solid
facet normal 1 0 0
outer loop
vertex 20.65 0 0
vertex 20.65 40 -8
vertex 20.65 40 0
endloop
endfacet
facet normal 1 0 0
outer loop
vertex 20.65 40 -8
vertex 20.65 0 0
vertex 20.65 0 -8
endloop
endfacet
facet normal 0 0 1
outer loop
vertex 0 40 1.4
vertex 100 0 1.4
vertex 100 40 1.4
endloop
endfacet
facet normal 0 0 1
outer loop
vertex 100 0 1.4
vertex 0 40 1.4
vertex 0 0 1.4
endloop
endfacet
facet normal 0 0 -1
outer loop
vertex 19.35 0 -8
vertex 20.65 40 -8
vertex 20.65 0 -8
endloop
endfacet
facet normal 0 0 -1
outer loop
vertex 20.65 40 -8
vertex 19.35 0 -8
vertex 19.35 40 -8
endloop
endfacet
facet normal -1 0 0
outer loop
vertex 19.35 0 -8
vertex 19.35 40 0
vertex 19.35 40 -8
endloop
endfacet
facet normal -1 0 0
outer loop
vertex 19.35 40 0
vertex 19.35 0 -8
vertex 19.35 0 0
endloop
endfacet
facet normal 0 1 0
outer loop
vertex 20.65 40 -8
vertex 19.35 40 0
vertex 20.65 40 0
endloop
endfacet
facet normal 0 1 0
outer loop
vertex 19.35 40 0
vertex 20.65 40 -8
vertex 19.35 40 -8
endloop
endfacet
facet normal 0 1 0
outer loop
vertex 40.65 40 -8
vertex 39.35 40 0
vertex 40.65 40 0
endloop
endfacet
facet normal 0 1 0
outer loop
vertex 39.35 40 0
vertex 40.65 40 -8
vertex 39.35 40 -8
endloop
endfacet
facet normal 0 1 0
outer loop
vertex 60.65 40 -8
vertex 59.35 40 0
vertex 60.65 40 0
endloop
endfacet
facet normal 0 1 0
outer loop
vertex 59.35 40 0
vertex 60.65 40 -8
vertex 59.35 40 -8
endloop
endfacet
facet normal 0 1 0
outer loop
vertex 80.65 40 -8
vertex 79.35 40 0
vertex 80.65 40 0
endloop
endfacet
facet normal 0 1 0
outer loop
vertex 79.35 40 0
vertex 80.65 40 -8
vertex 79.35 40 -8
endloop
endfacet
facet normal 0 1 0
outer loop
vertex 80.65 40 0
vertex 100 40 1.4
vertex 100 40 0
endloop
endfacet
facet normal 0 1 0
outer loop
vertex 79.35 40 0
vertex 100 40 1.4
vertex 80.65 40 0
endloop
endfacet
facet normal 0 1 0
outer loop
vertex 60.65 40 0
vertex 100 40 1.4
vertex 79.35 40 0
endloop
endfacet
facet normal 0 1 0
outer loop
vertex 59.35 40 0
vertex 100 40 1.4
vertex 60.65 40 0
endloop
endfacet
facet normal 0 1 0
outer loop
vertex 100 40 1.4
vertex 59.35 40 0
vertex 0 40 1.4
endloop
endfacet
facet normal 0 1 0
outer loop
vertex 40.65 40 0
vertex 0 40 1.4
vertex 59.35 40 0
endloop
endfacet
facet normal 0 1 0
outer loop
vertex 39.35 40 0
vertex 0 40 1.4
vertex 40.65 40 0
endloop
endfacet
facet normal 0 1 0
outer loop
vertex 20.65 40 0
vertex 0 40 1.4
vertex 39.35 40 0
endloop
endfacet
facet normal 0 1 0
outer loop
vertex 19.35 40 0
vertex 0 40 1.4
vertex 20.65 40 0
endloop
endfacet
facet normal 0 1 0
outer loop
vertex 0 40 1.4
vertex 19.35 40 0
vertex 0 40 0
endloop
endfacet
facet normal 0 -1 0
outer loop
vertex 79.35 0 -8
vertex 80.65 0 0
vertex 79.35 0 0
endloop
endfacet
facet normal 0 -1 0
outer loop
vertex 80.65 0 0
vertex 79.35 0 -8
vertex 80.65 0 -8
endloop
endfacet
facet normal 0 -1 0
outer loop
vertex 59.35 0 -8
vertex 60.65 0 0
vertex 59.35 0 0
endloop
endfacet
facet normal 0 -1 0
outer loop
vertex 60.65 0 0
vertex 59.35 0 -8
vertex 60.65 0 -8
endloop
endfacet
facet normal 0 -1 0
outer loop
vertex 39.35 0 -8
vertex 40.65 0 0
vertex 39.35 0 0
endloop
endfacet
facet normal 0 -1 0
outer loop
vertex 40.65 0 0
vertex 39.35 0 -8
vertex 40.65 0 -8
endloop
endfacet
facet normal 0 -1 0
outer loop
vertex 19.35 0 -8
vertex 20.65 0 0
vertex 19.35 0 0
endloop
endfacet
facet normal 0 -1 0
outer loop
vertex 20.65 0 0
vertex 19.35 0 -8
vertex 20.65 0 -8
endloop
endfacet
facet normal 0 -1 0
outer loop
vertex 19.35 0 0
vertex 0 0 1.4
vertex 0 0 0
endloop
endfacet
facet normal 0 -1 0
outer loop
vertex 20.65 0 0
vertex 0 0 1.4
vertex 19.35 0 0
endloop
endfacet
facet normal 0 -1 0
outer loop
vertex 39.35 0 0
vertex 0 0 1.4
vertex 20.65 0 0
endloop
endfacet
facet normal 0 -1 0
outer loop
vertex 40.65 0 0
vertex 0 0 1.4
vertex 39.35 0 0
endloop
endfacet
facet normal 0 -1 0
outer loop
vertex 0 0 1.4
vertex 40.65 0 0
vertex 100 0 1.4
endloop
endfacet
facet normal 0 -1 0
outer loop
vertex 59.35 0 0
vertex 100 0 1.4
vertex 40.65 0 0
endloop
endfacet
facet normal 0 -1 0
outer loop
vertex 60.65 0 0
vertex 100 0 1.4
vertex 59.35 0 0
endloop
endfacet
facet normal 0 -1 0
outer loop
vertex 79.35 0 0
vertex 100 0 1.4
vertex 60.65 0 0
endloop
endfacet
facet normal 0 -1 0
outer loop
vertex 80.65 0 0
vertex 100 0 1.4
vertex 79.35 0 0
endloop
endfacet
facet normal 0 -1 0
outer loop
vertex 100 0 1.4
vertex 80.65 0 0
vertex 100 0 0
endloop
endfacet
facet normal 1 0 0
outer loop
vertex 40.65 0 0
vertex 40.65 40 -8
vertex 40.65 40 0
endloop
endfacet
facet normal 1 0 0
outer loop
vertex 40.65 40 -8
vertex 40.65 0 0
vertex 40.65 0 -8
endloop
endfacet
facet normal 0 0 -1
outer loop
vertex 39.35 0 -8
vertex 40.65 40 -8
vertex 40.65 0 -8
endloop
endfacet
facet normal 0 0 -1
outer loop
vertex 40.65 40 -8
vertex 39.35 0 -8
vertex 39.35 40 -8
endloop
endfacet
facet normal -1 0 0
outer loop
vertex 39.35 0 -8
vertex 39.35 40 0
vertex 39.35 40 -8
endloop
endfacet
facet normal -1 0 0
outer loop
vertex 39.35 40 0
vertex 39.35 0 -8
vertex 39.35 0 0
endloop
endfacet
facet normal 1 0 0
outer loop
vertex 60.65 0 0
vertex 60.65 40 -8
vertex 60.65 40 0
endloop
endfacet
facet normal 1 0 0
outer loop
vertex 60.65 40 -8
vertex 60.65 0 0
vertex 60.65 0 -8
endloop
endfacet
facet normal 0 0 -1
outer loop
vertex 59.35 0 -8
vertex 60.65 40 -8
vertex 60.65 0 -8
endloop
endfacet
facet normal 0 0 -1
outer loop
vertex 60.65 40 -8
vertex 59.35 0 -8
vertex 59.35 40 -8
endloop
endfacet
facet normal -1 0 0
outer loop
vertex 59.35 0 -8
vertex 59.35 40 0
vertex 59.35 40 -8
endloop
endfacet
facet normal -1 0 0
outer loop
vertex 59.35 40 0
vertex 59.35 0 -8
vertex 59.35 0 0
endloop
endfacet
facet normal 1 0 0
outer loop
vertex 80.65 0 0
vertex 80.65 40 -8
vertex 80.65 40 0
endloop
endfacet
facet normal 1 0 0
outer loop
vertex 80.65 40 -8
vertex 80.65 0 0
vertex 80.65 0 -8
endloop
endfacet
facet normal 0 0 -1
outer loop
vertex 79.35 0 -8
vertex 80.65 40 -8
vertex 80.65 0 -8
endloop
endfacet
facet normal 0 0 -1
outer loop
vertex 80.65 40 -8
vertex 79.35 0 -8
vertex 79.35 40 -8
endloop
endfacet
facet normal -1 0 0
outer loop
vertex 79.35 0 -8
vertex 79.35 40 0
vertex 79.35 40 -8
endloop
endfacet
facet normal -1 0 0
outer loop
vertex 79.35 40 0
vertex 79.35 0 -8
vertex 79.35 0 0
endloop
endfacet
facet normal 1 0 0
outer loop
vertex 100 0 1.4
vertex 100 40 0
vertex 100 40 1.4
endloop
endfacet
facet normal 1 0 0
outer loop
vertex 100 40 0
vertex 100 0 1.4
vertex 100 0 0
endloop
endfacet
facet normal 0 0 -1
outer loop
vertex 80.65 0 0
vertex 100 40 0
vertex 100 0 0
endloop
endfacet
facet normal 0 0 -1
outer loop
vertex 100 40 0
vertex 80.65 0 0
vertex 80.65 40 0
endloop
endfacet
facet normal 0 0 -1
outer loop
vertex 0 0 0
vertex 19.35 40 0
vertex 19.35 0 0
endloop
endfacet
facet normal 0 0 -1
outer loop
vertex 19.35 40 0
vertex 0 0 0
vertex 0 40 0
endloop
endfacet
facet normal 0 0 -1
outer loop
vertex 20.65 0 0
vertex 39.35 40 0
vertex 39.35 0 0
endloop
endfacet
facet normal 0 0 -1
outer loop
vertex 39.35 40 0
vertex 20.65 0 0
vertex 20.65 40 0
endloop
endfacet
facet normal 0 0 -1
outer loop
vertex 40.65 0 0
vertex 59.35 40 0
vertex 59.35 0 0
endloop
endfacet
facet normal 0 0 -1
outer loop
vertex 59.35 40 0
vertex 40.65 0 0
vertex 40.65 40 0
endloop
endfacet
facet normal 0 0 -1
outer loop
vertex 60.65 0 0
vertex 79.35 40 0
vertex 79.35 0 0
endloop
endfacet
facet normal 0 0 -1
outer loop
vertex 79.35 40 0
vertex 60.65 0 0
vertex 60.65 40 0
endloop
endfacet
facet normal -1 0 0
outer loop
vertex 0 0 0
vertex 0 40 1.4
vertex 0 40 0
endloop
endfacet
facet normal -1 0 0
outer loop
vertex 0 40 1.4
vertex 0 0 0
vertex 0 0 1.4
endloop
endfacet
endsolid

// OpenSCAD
$fn = 32;

// ----------------------------------------------------------------------
// Ribbed panel: 1.4 mm panel
// ----------------------------------------------------------------------

// --- parameters (mm) ---
panel_l = 100;            // panel length, X
panel_w = 40;             // panel width, Y
panel_t = 1.4;            // panel thickness, Z
rib_t = 1.3;              // rib thickness
rib_h = 8;                // rib height below the panel
ribs = 4;                 // number of ribs

total_h = panel_t + rib_h;  // overall height

union() {
  cube([panel_l, panel_w, panel_t]);
  for (i = [1 : ribs])
    translate([i * panel_l / (ribs + 1) - rib_t / 2, 0, -rib_h])
      cube([rib_t, panel_w, rib_h + panel_t]);
}
